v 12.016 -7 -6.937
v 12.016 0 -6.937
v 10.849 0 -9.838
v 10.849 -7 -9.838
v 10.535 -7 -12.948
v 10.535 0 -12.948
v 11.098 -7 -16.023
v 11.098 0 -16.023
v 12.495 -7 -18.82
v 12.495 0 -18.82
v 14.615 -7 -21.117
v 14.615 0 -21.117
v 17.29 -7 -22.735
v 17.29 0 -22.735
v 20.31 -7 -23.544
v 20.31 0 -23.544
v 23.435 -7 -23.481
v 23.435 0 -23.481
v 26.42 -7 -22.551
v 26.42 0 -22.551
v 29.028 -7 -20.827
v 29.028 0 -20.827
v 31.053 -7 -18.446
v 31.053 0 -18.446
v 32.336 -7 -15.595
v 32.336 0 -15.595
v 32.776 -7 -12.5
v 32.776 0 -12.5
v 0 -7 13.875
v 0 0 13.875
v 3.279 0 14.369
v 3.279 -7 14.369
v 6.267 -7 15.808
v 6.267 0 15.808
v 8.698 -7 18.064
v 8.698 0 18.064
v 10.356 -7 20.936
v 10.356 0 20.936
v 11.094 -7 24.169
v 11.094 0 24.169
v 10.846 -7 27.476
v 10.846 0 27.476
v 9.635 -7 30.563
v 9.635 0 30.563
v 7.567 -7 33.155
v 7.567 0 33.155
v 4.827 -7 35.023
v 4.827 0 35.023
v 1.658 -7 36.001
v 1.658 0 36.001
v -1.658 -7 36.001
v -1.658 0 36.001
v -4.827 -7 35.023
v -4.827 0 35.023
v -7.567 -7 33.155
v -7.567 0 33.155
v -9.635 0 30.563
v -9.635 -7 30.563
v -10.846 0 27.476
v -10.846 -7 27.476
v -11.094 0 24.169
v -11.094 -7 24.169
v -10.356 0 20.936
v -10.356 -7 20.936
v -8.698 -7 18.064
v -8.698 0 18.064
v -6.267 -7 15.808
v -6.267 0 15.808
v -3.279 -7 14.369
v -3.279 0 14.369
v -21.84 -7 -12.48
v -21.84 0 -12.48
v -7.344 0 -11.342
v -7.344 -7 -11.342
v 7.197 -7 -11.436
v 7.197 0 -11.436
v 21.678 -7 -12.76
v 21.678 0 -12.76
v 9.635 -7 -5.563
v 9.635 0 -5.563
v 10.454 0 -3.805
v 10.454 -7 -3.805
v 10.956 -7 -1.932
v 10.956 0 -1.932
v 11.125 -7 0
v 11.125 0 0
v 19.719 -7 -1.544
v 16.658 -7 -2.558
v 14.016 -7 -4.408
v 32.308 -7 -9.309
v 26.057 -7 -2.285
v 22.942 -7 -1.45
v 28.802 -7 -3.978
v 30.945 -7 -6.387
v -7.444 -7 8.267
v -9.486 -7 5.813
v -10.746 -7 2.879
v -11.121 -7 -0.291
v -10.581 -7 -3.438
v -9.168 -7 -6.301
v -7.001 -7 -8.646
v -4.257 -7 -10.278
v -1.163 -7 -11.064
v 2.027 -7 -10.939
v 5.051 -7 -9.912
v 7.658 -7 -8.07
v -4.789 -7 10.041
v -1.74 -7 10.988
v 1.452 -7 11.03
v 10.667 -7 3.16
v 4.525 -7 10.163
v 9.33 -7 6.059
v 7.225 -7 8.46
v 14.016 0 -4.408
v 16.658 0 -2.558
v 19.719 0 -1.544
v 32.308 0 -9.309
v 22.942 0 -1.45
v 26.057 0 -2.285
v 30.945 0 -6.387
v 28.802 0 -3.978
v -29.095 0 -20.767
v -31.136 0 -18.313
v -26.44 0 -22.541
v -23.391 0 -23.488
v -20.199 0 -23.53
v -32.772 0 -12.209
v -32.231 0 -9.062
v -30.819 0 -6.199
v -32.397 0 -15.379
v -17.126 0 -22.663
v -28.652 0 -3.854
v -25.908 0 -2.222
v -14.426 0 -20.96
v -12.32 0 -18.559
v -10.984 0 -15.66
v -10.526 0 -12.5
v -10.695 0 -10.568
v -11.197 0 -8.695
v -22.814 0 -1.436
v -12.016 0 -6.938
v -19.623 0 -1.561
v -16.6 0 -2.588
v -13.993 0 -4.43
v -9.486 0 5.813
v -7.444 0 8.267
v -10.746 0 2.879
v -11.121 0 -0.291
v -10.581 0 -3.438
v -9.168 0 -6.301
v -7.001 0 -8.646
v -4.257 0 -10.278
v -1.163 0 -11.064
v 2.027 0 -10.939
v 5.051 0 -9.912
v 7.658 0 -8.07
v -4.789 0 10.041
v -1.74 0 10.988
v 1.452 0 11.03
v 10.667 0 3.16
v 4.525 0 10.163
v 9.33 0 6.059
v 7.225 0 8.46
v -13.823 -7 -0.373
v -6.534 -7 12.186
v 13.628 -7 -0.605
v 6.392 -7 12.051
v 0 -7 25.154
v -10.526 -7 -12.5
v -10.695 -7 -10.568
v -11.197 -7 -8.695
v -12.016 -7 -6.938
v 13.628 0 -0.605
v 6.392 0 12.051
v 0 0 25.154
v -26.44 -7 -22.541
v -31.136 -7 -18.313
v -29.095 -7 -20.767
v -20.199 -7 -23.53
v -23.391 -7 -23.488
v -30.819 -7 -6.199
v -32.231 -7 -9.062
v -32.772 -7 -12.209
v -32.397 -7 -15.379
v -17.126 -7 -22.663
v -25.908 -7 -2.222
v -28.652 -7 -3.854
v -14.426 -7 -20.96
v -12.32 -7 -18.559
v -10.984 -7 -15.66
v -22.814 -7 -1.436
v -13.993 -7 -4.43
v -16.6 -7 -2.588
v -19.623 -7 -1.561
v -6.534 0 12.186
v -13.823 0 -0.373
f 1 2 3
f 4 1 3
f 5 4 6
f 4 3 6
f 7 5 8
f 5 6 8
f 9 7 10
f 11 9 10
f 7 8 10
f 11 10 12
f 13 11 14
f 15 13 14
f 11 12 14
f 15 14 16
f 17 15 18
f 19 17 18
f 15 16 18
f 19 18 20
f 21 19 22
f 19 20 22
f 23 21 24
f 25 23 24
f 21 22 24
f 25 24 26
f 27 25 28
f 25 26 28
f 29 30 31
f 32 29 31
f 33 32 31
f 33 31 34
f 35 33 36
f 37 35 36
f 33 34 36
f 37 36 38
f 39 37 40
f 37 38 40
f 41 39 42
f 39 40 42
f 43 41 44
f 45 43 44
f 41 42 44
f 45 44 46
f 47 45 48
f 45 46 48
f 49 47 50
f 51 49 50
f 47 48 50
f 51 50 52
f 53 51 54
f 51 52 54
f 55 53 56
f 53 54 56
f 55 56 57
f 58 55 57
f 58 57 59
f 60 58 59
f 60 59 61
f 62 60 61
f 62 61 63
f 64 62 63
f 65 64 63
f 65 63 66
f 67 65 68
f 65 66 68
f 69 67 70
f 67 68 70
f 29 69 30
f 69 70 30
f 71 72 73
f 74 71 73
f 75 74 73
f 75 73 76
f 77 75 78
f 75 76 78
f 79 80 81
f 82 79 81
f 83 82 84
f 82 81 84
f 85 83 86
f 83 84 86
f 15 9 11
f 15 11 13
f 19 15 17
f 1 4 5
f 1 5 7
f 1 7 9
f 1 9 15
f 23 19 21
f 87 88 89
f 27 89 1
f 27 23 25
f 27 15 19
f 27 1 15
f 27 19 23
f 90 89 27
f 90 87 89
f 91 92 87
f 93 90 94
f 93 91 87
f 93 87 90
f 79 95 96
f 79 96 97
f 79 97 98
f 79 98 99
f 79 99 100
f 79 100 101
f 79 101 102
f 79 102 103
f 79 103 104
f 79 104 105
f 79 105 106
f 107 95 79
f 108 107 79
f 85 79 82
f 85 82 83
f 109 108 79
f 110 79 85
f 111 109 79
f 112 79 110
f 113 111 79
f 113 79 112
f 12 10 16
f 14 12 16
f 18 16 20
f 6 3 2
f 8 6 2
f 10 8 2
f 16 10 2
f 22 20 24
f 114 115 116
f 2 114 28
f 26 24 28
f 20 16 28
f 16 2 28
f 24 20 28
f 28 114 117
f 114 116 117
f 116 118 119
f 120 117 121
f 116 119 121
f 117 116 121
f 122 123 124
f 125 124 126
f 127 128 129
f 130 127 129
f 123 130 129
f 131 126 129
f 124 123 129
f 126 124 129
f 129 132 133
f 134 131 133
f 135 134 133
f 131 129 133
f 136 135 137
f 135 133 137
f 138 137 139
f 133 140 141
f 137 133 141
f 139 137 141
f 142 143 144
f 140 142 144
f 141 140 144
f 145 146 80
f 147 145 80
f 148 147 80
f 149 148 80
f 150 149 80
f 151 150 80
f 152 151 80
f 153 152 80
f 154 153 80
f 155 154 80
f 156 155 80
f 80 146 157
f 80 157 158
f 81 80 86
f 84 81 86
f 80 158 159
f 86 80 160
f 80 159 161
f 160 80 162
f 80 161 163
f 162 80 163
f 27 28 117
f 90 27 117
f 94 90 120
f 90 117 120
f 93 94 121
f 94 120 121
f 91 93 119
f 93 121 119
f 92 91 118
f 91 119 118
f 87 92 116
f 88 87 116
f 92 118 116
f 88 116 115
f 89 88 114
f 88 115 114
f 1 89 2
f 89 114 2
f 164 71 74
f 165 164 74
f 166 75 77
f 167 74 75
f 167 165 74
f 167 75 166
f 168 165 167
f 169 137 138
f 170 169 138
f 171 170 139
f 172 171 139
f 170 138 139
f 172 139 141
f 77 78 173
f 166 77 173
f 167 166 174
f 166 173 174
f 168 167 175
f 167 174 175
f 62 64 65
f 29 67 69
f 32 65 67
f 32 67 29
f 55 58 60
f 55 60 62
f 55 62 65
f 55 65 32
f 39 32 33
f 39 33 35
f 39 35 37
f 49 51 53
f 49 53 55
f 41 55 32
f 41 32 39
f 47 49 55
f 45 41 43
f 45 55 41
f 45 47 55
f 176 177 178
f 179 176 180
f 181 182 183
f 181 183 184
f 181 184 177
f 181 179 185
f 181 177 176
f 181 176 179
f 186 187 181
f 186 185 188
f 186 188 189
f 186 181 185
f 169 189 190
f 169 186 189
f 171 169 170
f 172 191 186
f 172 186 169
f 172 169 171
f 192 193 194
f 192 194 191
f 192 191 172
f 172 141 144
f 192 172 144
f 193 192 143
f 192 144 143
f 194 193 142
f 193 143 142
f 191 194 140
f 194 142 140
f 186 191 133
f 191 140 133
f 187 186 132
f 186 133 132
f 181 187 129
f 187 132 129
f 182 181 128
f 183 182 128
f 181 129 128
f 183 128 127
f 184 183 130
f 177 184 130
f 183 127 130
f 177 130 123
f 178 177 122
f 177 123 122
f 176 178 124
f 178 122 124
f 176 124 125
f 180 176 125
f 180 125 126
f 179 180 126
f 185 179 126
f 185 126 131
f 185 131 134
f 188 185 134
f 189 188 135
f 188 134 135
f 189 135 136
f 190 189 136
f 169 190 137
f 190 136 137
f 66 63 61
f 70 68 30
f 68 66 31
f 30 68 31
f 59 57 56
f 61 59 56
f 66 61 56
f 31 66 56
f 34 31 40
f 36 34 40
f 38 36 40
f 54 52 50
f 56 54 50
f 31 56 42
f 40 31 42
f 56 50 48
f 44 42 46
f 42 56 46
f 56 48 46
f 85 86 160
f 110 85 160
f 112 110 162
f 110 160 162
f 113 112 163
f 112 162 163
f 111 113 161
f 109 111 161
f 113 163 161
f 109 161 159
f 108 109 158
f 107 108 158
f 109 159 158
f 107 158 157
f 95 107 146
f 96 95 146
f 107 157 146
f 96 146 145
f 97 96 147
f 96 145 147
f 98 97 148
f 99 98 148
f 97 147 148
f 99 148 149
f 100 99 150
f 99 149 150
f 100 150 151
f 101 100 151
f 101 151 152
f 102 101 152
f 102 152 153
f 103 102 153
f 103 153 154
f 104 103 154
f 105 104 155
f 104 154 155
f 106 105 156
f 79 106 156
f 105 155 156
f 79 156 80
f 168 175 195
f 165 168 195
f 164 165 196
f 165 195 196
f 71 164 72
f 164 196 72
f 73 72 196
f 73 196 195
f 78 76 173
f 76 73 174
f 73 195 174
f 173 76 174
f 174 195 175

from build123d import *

# Parameters (mm, degrees)
F2_DEPTH = 7
F3_DEPTH = 7


# Not quite as in the source:
# - a feature of the source that left no trace in its solid (it failed there, or was rolled back) is left out


with BuildPart() as f2:
    # F0 (on Front) → F2 (new body)
    with BuildSketch(Plane.XZ):
        with BuildLine():
            ThreePointArc((9.6345326171, -5.5625), (10.7459248175, -2.8793618768), (11.125, 0))
            ThreePointArc((11.125, 0), (7.8665629407, 7.8665629407), (0, 11.125))
            Line((0, 11.125), (0, 0))
            Line((0, 0), (9.6345326171, -5.5625))
        make_face()
        with BuildLine():
            Line((0, 0), (0, 11.125))
            ThreePointArc((0, 11.125), (-9.6345326171, 5.5625), (-9.6345326171, -5.5625))
            Line((-9.6345326171, -5.5625), (0, 0))
        make_face()
        with BuildLine():
            ThreePointArc((-9.6345326171, -5.5625), (0, -11.125), (9.6345326171, -5.5625))
            Line((9.6345326171, -5.5625), (0, 0))
            Line((0, 0), (-9.6345326171, -5.5625))
        make_face()
    extrude(amount=F2_DEPTH)


with BuildPart() as f2b:
    # F0 (on Front) → F2, piece 2 (new body)
    with BuildSketch(Plane.XZ):
        with BuildLine():
            ThreePointArc((32.7756350946, -12.5), (24.5299969714, -1.7540751825), (12.0161024775, -6.9375))
            ThreePointArc((12.0161024775, -6.9375), (18.7712732178, -23.2459248175), (32.7756350946, -12.5))
        make_face()
    extrude(amount=F2_DEPTH)


with BuildPart() as f2c:
    # F0 (on Front) → F2, piece 3 (new body)
    with BuildSketch(Plane.XZ):
        with BuildLine():
            ThreePointArc((-10.5256350946, -12.5), (-10.9047102771, -9.6206381232), (-12.0161024775, -6.9375))
            ThreePointArc((-12.0161024775, -6.9375), (-32.3965599121, -15.3793618768), (-10.5256350946, -12.5))
        make_face()
    extrude(amount=F2_DEPTH)


with BuildPart() as f2d:
    # F0 (on Front) → F2, piece 4 (new body)
    with BuildSketch(Plane.XZ):
        with BuildLine():
            ThreePointArc((11.125, 25), (-7.8665629407, 32.8665629407), (0, 13.875))
            ThreePointArc((0, 13.875), (7.8665629407, 17.1334370593), (11.125, 25))
        make_face()
    extrude(amount=F2_DEPTH)


with BuildPart() as f3:
    # F1 (on Front) → F3 (new body)
    with BuildSketch(Plane.XZ):
        with BuildLine():
            ThreePointArc((0, 25.154441337), (-10.0854973849, 5.8528683876), (-21.8402211228, -12.480010428))
            ThreePointArc((-21.8402211228, -12.480010428), (-0.0723465521, -11.2352282244), (21.6776926373, -12.7602335754))
            ThreePointArc((21.6776926373, -12.7602335754), (9.9063592573, 5.6639549628), (0, 25.154441337))
        make_face()
    extrude(amount=F3_DEPTH)


solid = Compound([f2.part, f2b.part, f2c.part, f2d.part, f3.part])
